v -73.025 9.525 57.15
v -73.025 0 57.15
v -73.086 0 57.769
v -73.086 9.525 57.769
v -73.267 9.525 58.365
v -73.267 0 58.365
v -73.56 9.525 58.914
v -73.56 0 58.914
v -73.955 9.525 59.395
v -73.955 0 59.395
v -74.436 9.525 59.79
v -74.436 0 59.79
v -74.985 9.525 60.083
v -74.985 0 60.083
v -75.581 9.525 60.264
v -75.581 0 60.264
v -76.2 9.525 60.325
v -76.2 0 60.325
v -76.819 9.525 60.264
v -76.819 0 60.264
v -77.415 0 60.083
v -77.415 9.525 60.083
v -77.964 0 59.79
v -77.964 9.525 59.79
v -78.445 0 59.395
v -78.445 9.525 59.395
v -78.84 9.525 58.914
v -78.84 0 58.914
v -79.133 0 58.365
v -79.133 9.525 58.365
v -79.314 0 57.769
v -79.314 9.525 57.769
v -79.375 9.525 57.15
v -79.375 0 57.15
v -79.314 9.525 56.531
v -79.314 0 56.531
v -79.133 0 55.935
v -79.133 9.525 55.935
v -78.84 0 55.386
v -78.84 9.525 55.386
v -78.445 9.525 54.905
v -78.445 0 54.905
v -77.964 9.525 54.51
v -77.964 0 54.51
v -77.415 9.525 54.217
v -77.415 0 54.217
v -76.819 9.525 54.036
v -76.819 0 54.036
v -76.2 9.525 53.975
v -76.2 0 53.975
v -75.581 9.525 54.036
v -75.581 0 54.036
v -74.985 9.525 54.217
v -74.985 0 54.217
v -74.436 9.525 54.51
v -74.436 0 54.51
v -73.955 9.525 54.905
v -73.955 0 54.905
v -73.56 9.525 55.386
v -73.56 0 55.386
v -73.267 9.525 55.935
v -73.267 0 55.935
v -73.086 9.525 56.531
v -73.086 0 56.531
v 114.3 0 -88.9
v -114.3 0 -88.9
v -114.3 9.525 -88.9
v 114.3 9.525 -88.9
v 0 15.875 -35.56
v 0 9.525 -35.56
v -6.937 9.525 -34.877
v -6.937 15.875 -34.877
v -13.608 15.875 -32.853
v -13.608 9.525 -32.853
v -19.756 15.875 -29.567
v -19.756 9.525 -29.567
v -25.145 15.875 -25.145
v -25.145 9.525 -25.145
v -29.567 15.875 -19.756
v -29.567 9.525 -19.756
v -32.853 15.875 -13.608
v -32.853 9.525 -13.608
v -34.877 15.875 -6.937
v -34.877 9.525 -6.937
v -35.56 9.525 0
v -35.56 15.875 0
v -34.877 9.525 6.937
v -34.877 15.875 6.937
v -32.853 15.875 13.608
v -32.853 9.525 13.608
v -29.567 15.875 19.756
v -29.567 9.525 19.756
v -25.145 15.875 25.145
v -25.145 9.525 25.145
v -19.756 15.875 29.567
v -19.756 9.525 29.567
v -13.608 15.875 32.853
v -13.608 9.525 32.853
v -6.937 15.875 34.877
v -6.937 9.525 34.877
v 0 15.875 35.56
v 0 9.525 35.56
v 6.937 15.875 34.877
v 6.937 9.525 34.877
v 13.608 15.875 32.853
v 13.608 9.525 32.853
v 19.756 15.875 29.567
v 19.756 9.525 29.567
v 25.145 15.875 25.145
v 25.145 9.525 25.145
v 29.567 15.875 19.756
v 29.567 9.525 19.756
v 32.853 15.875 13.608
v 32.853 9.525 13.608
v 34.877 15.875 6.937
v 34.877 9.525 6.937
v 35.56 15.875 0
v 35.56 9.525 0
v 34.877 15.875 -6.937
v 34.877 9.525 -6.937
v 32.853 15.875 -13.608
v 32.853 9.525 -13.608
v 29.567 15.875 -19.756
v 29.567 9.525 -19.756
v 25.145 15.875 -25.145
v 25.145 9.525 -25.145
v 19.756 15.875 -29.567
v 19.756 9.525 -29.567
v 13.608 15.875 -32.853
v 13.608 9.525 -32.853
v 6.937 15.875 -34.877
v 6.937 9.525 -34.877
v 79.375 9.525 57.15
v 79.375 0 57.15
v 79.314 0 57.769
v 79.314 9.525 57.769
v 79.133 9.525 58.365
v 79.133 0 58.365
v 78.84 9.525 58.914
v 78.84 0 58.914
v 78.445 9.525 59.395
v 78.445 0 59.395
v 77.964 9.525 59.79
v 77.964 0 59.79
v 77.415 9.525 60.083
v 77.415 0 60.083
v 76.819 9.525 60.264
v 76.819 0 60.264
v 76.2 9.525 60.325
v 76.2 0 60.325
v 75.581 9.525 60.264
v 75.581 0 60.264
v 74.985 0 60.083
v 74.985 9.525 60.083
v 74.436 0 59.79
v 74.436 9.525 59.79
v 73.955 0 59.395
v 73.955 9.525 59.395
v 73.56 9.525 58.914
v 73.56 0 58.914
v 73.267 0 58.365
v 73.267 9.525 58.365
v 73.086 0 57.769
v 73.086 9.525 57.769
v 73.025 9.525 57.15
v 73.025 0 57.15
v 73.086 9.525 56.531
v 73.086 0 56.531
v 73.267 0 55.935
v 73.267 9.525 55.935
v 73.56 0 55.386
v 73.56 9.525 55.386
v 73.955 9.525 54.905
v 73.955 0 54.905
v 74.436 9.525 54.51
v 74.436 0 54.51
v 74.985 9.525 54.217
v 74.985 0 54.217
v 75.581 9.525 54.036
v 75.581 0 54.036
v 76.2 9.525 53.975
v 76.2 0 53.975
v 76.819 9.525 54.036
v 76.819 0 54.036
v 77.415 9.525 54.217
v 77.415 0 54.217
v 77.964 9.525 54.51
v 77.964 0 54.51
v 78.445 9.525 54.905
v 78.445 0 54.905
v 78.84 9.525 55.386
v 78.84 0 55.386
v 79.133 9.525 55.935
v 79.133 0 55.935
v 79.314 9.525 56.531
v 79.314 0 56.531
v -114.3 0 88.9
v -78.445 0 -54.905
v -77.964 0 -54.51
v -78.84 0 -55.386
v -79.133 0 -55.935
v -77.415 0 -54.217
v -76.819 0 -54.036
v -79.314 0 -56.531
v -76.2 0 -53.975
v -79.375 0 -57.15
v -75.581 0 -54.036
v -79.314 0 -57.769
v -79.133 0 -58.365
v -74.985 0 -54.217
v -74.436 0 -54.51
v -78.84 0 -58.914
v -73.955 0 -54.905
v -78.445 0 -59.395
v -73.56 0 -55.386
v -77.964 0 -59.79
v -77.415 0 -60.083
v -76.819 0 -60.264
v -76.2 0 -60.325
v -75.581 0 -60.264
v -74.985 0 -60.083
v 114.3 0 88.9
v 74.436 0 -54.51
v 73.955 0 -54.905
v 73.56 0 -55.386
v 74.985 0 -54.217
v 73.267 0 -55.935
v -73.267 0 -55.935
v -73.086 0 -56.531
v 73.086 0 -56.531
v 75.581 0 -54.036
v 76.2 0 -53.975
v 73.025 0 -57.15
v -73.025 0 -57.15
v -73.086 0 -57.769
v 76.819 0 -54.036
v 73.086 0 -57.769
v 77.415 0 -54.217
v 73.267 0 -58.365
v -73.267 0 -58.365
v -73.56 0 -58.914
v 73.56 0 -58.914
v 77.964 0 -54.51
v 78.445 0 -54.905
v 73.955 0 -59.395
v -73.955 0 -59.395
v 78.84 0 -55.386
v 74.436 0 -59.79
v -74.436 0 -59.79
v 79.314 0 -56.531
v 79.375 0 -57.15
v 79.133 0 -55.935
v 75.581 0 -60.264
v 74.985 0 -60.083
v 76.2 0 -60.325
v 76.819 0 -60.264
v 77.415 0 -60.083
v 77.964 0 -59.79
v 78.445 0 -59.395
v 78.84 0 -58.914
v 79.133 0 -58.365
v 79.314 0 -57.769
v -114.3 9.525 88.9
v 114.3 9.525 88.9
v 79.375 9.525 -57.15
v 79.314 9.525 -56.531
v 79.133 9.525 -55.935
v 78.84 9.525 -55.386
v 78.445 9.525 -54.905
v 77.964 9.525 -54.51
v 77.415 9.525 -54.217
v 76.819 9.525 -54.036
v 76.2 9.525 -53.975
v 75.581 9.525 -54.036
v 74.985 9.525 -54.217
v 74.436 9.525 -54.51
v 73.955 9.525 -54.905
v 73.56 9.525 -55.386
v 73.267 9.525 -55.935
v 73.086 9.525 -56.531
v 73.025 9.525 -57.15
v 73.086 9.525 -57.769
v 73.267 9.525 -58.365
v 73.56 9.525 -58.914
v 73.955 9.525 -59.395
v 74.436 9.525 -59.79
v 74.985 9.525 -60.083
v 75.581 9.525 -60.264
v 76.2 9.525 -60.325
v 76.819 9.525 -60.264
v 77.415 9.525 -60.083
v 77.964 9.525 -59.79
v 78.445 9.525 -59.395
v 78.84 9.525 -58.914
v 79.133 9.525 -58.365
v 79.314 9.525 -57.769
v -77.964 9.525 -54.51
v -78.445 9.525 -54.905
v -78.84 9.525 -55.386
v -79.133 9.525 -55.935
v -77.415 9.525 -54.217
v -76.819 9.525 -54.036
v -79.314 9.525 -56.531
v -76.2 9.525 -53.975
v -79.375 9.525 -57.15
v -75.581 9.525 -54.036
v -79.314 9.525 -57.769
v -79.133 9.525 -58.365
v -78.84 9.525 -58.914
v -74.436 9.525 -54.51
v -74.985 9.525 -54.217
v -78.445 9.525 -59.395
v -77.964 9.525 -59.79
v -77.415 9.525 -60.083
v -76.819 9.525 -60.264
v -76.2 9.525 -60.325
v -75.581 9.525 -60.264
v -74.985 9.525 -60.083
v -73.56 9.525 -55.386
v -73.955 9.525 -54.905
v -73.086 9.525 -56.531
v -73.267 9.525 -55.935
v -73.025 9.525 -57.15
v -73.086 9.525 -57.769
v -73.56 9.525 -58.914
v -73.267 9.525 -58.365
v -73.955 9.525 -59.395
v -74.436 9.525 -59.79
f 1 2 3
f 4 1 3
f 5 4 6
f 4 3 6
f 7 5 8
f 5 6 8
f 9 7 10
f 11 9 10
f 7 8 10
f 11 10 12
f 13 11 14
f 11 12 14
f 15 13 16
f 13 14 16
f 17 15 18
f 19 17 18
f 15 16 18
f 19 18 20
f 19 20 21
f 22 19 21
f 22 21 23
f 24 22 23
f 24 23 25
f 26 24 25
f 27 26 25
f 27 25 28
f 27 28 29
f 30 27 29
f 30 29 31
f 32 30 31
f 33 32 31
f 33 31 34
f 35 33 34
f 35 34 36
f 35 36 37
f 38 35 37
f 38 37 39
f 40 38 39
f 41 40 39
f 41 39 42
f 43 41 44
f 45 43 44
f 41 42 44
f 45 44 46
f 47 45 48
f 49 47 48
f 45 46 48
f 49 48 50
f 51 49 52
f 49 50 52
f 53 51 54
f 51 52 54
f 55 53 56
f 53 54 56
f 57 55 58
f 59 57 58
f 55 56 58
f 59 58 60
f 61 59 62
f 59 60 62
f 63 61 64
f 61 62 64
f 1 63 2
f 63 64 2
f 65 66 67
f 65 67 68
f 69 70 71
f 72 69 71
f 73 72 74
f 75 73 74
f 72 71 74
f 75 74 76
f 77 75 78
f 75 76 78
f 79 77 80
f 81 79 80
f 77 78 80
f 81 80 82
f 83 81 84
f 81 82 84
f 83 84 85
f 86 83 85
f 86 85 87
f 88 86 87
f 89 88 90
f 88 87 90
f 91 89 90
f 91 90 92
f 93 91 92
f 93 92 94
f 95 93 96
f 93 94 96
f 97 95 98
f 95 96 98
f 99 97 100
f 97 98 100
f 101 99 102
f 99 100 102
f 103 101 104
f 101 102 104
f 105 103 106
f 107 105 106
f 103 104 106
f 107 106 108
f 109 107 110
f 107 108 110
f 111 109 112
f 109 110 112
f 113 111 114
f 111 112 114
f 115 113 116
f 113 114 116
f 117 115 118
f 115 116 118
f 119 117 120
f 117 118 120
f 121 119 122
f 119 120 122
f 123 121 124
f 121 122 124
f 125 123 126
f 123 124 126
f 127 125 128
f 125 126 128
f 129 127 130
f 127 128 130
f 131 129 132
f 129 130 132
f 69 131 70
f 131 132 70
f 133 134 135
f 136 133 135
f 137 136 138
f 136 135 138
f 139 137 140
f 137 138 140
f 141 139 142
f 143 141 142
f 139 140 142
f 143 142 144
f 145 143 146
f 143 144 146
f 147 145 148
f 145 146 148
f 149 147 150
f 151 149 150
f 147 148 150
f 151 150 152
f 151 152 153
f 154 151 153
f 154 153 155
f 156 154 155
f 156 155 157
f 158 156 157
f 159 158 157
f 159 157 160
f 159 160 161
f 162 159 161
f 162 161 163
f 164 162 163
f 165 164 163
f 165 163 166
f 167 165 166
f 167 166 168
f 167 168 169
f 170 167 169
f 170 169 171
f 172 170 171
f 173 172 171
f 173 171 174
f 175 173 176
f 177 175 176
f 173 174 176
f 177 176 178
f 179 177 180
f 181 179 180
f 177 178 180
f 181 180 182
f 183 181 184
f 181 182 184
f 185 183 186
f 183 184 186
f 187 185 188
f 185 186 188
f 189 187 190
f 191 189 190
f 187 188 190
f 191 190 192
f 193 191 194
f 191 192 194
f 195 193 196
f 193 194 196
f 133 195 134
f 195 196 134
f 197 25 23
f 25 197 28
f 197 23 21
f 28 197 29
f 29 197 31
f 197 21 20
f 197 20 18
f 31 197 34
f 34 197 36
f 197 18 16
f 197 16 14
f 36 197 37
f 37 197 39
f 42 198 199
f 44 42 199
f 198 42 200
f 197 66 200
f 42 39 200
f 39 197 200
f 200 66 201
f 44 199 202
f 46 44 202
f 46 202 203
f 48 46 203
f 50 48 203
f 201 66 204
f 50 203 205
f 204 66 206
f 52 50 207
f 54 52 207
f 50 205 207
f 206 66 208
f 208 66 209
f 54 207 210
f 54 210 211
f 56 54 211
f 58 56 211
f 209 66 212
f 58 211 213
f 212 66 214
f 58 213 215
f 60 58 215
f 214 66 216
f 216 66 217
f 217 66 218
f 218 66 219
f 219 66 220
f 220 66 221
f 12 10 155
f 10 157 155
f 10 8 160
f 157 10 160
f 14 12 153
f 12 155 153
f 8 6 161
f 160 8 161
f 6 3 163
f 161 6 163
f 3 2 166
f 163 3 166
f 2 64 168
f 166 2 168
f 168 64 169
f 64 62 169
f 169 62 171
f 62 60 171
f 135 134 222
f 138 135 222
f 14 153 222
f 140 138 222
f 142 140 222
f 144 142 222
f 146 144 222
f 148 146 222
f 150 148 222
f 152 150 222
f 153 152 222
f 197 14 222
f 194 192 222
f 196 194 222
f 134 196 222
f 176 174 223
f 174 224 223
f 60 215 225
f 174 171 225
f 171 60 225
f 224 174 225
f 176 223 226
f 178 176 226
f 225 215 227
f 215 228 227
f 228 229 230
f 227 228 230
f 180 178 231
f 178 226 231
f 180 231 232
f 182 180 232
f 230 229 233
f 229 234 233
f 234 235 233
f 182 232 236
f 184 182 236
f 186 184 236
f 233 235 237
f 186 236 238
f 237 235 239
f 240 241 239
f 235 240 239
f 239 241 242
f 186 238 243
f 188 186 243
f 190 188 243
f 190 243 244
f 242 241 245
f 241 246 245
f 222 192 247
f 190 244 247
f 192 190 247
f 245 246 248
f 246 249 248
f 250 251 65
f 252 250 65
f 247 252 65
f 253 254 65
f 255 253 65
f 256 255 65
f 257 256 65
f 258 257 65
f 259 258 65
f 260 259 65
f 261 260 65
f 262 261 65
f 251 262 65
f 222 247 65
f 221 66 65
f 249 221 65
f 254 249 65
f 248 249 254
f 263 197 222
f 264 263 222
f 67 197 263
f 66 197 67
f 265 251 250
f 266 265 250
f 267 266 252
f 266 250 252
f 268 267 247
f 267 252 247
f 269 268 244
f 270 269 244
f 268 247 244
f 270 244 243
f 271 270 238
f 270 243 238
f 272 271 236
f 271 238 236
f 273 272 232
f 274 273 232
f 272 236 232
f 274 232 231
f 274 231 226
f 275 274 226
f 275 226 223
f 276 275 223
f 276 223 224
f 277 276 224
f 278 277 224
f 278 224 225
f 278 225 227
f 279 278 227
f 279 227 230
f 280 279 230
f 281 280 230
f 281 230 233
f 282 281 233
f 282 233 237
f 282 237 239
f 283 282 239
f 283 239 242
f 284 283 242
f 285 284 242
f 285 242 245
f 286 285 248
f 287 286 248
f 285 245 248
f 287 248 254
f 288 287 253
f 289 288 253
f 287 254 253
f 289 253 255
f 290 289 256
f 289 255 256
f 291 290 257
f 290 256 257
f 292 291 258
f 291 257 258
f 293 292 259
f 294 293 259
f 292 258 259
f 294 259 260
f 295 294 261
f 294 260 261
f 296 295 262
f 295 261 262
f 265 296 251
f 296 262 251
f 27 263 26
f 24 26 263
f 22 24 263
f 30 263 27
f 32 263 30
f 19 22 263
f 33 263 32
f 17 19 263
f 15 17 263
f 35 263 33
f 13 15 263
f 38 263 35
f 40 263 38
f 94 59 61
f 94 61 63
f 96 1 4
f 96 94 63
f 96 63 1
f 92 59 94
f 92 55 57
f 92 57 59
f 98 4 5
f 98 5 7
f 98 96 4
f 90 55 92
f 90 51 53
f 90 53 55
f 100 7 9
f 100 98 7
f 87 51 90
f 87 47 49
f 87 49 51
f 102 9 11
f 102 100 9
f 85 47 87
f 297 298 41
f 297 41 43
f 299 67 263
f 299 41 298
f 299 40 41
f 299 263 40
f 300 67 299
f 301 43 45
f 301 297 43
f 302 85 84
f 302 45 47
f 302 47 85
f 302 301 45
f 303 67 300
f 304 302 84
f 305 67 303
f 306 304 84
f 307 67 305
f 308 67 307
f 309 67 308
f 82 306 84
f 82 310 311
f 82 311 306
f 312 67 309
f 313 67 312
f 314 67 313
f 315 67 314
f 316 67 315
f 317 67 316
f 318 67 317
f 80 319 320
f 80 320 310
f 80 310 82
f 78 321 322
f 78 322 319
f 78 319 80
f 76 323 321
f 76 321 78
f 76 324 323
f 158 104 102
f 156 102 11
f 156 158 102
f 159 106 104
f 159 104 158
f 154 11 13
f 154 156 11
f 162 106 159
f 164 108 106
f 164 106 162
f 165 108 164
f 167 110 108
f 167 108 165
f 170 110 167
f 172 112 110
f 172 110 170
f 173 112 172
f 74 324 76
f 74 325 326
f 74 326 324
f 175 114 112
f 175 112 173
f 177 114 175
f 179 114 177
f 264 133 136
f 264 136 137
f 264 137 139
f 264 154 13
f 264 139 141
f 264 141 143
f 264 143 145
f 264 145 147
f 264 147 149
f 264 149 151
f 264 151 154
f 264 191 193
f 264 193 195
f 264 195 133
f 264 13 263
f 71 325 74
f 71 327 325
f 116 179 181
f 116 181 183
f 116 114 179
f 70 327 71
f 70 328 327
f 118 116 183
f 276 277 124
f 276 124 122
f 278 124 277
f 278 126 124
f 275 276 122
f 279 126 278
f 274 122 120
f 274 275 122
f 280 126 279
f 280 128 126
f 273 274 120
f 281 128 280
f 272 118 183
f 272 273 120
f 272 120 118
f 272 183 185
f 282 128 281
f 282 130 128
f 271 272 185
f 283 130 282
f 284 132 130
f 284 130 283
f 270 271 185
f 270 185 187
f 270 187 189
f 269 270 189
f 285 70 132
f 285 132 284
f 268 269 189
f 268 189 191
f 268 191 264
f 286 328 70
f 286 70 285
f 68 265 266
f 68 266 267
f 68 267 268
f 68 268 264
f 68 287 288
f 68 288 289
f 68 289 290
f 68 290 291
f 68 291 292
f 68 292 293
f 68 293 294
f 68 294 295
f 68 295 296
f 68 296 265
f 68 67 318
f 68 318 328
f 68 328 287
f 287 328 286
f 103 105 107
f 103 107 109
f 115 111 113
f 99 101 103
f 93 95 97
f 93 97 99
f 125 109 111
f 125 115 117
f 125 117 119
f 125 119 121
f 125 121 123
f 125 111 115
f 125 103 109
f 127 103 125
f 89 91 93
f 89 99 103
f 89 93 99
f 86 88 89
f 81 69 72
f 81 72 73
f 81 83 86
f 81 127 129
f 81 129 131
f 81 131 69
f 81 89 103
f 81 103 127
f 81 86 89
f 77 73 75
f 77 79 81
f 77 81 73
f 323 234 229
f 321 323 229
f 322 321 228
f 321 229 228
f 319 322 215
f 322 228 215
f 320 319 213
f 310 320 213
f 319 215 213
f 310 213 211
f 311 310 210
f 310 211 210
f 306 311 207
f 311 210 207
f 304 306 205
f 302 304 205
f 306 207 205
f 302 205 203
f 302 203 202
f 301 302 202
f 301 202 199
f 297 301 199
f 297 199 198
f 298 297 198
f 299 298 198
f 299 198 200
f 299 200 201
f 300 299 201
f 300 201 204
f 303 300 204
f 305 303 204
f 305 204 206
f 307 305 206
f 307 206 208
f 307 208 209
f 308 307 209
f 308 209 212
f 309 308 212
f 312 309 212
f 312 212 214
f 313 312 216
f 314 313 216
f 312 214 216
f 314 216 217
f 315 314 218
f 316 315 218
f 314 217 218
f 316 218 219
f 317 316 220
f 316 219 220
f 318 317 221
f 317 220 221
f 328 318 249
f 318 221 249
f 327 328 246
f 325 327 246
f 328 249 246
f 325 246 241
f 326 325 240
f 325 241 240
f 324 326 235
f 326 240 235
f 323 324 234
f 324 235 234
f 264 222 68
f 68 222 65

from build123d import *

# Parameters (mm, degrees)
SKETCH1_W               = 228.6
SKETCH1_H               = 177.8
BOSS_EXTRUDE1_DEPTH     = 9.525
F_1_4_20_TAPPED_HOLE1_D = 6.35
SKETCH5_R               = 35.56
BOSS_EXTRUDE2_DEPTH     = 6.35


with BuildPart() as part:
    # Sketch1 → Boss-Extrude1 (new body)
    with BuildSketch(Plane(origin=(0, 0, 0), x_dir=(1, 0, 0), z_dir=(0, 1, 0))):
        Rectangle(SKETCH1_W, SKETCH1_H)
    extrude(amount=BOSS_EXTRUDE1_DEPTH)

    # 1/4-20 Tapped Hole1 (through all)
    with Locations(Plane(origin=(0, 9.525, 0), x_dir=(-1, 0, 0), z_dir=(0, 1, 0))):
        with Locations((76.2, -57.15), (76.2, 57.15), (-76.2, 57.15), (-76.2, -57.15)):
            Hole(F_1_4_20_TAPPED_HOLE1_D / 2)

    # Sketch5 → Boss-Extrude2 (add)
    with BuildSketch(Plane(origin=(0, 9.525, 0), x_dir=(1, 0, 0), z_dir=(0, 1, 0))):
        with Locations(Location((0, 0, 0), (0, 0, 90))):
            Circle(SKETCH5_R)
    extrude(amount=BOSS_EXTRUDE2_DEPTH)


solid = part.part
